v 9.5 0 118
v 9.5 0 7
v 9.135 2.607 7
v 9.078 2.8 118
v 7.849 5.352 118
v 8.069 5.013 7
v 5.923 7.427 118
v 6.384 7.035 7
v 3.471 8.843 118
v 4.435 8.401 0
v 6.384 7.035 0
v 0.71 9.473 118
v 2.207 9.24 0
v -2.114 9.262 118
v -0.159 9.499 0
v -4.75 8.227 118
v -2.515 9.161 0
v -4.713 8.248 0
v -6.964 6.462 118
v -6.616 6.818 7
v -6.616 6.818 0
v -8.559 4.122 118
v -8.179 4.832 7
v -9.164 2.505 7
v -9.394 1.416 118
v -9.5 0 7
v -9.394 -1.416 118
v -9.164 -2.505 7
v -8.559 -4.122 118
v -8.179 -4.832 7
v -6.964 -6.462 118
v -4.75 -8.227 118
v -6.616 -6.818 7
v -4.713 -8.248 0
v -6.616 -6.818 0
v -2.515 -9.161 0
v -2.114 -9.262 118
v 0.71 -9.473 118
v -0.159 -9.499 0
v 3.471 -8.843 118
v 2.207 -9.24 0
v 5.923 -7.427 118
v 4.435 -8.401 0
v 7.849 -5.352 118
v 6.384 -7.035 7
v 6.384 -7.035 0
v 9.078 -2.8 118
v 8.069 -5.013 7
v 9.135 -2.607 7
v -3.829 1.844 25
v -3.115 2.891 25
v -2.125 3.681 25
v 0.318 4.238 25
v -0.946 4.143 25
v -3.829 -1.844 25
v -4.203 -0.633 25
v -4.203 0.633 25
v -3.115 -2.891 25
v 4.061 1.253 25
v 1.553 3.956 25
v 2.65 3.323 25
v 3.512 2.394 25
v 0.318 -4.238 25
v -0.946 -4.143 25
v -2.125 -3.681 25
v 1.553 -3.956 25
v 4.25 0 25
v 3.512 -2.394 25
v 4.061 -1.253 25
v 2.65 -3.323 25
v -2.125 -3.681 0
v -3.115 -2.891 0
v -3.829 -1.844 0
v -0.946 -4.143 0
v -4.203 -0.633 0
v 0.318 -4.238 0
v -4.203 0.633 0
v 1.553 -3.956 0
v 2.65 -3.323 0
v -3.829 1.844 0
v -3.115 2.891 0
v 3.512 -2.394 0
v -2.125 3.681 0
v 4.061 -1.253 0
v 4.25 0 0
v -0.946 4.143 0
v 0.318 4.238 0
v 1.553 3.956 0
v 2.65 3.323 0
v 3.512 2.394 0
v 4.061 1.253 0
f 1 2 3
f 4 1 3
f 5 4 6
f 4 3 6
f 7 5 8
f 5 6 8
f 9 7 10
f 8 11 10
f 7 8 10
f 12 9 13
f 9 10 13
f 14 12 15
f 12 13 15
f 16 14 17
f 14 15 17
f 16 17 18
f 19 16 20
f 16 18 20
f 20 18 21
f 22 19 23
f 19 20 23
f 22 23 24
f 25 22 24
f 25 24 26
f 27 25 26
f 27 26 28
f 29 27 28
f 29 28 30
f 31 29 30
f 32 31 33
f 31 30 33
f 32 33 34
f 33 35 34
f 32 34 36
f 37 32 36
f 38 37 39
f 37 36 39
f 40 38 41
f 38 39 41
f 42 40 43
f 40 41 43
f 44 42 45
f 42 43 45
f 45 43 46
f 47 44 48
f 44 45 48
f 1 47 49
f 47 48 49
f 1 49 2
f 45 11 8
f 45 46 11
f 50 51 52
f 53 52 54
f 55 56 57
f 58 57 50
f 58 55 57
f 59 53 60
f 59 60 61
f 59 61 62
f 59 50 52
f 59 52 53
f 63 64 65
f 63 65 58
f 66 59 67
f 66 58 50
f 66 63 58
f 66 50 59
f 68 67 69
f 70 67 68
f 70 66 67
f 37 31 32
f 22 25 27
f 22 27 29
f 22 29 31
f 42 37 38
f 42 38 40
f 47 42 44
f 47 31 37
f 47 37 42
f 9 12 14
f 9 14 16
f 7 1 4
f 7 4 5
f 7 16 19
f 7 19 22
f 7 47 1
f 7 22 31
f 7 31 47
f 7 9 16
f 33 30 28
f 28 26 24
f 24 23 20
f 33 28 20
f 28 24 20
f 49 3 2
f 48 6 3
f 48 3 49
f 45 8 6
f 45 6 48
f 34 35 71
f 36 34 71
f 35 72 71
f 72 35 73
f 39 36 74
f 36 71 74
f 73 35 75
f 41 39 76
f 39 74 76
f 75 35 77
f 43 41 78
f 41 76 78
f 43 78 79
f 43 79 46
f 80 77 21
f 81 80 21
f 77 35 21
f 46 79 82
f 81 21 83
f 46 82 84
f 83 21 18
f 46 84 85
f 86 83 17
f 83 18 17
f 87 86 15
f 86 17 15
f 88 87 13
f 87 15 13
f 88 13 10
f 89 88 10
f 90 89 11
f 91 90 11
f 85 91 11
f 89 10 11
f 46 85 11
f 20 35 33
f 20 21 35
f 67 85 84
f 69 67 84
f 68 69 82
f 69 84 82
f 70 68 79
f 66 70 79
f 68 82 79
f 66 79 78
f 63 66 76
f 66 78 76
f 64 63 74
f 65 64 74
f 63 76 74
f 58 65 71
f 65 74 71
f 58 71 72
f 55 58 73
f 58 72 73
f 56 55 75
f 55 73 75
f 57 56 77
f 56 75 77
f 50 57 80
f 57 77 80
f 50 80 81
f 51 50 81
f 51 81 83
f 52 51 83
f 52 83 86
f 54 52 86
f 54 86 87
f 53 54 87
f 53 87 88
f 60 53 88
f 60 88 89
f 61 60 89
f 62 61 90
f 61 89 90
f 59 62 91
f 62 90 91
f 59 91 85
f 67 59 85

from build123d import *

# Parameters (mm, degrees)
F0_R     = 9.5
F1_DEPTH = 118
F2_W     = 9.514893
F2_H     = 14
F2_W_2   = 10.271802
F3_DEPTH = 12.5
F4_R     = 4.25
F5_DEPTH = 25


with BuildPart() as f1:
    # F0 (on Top) → F1 (new body)
    with BuildSketch(Plane.XY):
        Circle(F0_R)
    extrude(amount=F1_DEPTH)

    # F2 (on Front) → F3 (cut, symmetric)
    with BuildSketch(Plane.XZ):
        with Locations((-11.373281, 0)):
            Rectangle(F2_W, F2_H)
        with Locations((11.520066, 0)):
            Rectangle(F2_W_2, F2_H)
    extrude(amount=F3_DEPTH, both=True, mode=Mode.SUBTRACT)

    # F4 (on face) → F5 (cut)
    with BuildSketch(Plane(origin=(0, 0, 0), x_dir=(1, 0, 0), z_dir=(0, 0, -1))):
        Circle(F4_R)
    extrude(amount=-F5_DEPTH, mode=Mode.SUBTRACT)


solid = f1.part
